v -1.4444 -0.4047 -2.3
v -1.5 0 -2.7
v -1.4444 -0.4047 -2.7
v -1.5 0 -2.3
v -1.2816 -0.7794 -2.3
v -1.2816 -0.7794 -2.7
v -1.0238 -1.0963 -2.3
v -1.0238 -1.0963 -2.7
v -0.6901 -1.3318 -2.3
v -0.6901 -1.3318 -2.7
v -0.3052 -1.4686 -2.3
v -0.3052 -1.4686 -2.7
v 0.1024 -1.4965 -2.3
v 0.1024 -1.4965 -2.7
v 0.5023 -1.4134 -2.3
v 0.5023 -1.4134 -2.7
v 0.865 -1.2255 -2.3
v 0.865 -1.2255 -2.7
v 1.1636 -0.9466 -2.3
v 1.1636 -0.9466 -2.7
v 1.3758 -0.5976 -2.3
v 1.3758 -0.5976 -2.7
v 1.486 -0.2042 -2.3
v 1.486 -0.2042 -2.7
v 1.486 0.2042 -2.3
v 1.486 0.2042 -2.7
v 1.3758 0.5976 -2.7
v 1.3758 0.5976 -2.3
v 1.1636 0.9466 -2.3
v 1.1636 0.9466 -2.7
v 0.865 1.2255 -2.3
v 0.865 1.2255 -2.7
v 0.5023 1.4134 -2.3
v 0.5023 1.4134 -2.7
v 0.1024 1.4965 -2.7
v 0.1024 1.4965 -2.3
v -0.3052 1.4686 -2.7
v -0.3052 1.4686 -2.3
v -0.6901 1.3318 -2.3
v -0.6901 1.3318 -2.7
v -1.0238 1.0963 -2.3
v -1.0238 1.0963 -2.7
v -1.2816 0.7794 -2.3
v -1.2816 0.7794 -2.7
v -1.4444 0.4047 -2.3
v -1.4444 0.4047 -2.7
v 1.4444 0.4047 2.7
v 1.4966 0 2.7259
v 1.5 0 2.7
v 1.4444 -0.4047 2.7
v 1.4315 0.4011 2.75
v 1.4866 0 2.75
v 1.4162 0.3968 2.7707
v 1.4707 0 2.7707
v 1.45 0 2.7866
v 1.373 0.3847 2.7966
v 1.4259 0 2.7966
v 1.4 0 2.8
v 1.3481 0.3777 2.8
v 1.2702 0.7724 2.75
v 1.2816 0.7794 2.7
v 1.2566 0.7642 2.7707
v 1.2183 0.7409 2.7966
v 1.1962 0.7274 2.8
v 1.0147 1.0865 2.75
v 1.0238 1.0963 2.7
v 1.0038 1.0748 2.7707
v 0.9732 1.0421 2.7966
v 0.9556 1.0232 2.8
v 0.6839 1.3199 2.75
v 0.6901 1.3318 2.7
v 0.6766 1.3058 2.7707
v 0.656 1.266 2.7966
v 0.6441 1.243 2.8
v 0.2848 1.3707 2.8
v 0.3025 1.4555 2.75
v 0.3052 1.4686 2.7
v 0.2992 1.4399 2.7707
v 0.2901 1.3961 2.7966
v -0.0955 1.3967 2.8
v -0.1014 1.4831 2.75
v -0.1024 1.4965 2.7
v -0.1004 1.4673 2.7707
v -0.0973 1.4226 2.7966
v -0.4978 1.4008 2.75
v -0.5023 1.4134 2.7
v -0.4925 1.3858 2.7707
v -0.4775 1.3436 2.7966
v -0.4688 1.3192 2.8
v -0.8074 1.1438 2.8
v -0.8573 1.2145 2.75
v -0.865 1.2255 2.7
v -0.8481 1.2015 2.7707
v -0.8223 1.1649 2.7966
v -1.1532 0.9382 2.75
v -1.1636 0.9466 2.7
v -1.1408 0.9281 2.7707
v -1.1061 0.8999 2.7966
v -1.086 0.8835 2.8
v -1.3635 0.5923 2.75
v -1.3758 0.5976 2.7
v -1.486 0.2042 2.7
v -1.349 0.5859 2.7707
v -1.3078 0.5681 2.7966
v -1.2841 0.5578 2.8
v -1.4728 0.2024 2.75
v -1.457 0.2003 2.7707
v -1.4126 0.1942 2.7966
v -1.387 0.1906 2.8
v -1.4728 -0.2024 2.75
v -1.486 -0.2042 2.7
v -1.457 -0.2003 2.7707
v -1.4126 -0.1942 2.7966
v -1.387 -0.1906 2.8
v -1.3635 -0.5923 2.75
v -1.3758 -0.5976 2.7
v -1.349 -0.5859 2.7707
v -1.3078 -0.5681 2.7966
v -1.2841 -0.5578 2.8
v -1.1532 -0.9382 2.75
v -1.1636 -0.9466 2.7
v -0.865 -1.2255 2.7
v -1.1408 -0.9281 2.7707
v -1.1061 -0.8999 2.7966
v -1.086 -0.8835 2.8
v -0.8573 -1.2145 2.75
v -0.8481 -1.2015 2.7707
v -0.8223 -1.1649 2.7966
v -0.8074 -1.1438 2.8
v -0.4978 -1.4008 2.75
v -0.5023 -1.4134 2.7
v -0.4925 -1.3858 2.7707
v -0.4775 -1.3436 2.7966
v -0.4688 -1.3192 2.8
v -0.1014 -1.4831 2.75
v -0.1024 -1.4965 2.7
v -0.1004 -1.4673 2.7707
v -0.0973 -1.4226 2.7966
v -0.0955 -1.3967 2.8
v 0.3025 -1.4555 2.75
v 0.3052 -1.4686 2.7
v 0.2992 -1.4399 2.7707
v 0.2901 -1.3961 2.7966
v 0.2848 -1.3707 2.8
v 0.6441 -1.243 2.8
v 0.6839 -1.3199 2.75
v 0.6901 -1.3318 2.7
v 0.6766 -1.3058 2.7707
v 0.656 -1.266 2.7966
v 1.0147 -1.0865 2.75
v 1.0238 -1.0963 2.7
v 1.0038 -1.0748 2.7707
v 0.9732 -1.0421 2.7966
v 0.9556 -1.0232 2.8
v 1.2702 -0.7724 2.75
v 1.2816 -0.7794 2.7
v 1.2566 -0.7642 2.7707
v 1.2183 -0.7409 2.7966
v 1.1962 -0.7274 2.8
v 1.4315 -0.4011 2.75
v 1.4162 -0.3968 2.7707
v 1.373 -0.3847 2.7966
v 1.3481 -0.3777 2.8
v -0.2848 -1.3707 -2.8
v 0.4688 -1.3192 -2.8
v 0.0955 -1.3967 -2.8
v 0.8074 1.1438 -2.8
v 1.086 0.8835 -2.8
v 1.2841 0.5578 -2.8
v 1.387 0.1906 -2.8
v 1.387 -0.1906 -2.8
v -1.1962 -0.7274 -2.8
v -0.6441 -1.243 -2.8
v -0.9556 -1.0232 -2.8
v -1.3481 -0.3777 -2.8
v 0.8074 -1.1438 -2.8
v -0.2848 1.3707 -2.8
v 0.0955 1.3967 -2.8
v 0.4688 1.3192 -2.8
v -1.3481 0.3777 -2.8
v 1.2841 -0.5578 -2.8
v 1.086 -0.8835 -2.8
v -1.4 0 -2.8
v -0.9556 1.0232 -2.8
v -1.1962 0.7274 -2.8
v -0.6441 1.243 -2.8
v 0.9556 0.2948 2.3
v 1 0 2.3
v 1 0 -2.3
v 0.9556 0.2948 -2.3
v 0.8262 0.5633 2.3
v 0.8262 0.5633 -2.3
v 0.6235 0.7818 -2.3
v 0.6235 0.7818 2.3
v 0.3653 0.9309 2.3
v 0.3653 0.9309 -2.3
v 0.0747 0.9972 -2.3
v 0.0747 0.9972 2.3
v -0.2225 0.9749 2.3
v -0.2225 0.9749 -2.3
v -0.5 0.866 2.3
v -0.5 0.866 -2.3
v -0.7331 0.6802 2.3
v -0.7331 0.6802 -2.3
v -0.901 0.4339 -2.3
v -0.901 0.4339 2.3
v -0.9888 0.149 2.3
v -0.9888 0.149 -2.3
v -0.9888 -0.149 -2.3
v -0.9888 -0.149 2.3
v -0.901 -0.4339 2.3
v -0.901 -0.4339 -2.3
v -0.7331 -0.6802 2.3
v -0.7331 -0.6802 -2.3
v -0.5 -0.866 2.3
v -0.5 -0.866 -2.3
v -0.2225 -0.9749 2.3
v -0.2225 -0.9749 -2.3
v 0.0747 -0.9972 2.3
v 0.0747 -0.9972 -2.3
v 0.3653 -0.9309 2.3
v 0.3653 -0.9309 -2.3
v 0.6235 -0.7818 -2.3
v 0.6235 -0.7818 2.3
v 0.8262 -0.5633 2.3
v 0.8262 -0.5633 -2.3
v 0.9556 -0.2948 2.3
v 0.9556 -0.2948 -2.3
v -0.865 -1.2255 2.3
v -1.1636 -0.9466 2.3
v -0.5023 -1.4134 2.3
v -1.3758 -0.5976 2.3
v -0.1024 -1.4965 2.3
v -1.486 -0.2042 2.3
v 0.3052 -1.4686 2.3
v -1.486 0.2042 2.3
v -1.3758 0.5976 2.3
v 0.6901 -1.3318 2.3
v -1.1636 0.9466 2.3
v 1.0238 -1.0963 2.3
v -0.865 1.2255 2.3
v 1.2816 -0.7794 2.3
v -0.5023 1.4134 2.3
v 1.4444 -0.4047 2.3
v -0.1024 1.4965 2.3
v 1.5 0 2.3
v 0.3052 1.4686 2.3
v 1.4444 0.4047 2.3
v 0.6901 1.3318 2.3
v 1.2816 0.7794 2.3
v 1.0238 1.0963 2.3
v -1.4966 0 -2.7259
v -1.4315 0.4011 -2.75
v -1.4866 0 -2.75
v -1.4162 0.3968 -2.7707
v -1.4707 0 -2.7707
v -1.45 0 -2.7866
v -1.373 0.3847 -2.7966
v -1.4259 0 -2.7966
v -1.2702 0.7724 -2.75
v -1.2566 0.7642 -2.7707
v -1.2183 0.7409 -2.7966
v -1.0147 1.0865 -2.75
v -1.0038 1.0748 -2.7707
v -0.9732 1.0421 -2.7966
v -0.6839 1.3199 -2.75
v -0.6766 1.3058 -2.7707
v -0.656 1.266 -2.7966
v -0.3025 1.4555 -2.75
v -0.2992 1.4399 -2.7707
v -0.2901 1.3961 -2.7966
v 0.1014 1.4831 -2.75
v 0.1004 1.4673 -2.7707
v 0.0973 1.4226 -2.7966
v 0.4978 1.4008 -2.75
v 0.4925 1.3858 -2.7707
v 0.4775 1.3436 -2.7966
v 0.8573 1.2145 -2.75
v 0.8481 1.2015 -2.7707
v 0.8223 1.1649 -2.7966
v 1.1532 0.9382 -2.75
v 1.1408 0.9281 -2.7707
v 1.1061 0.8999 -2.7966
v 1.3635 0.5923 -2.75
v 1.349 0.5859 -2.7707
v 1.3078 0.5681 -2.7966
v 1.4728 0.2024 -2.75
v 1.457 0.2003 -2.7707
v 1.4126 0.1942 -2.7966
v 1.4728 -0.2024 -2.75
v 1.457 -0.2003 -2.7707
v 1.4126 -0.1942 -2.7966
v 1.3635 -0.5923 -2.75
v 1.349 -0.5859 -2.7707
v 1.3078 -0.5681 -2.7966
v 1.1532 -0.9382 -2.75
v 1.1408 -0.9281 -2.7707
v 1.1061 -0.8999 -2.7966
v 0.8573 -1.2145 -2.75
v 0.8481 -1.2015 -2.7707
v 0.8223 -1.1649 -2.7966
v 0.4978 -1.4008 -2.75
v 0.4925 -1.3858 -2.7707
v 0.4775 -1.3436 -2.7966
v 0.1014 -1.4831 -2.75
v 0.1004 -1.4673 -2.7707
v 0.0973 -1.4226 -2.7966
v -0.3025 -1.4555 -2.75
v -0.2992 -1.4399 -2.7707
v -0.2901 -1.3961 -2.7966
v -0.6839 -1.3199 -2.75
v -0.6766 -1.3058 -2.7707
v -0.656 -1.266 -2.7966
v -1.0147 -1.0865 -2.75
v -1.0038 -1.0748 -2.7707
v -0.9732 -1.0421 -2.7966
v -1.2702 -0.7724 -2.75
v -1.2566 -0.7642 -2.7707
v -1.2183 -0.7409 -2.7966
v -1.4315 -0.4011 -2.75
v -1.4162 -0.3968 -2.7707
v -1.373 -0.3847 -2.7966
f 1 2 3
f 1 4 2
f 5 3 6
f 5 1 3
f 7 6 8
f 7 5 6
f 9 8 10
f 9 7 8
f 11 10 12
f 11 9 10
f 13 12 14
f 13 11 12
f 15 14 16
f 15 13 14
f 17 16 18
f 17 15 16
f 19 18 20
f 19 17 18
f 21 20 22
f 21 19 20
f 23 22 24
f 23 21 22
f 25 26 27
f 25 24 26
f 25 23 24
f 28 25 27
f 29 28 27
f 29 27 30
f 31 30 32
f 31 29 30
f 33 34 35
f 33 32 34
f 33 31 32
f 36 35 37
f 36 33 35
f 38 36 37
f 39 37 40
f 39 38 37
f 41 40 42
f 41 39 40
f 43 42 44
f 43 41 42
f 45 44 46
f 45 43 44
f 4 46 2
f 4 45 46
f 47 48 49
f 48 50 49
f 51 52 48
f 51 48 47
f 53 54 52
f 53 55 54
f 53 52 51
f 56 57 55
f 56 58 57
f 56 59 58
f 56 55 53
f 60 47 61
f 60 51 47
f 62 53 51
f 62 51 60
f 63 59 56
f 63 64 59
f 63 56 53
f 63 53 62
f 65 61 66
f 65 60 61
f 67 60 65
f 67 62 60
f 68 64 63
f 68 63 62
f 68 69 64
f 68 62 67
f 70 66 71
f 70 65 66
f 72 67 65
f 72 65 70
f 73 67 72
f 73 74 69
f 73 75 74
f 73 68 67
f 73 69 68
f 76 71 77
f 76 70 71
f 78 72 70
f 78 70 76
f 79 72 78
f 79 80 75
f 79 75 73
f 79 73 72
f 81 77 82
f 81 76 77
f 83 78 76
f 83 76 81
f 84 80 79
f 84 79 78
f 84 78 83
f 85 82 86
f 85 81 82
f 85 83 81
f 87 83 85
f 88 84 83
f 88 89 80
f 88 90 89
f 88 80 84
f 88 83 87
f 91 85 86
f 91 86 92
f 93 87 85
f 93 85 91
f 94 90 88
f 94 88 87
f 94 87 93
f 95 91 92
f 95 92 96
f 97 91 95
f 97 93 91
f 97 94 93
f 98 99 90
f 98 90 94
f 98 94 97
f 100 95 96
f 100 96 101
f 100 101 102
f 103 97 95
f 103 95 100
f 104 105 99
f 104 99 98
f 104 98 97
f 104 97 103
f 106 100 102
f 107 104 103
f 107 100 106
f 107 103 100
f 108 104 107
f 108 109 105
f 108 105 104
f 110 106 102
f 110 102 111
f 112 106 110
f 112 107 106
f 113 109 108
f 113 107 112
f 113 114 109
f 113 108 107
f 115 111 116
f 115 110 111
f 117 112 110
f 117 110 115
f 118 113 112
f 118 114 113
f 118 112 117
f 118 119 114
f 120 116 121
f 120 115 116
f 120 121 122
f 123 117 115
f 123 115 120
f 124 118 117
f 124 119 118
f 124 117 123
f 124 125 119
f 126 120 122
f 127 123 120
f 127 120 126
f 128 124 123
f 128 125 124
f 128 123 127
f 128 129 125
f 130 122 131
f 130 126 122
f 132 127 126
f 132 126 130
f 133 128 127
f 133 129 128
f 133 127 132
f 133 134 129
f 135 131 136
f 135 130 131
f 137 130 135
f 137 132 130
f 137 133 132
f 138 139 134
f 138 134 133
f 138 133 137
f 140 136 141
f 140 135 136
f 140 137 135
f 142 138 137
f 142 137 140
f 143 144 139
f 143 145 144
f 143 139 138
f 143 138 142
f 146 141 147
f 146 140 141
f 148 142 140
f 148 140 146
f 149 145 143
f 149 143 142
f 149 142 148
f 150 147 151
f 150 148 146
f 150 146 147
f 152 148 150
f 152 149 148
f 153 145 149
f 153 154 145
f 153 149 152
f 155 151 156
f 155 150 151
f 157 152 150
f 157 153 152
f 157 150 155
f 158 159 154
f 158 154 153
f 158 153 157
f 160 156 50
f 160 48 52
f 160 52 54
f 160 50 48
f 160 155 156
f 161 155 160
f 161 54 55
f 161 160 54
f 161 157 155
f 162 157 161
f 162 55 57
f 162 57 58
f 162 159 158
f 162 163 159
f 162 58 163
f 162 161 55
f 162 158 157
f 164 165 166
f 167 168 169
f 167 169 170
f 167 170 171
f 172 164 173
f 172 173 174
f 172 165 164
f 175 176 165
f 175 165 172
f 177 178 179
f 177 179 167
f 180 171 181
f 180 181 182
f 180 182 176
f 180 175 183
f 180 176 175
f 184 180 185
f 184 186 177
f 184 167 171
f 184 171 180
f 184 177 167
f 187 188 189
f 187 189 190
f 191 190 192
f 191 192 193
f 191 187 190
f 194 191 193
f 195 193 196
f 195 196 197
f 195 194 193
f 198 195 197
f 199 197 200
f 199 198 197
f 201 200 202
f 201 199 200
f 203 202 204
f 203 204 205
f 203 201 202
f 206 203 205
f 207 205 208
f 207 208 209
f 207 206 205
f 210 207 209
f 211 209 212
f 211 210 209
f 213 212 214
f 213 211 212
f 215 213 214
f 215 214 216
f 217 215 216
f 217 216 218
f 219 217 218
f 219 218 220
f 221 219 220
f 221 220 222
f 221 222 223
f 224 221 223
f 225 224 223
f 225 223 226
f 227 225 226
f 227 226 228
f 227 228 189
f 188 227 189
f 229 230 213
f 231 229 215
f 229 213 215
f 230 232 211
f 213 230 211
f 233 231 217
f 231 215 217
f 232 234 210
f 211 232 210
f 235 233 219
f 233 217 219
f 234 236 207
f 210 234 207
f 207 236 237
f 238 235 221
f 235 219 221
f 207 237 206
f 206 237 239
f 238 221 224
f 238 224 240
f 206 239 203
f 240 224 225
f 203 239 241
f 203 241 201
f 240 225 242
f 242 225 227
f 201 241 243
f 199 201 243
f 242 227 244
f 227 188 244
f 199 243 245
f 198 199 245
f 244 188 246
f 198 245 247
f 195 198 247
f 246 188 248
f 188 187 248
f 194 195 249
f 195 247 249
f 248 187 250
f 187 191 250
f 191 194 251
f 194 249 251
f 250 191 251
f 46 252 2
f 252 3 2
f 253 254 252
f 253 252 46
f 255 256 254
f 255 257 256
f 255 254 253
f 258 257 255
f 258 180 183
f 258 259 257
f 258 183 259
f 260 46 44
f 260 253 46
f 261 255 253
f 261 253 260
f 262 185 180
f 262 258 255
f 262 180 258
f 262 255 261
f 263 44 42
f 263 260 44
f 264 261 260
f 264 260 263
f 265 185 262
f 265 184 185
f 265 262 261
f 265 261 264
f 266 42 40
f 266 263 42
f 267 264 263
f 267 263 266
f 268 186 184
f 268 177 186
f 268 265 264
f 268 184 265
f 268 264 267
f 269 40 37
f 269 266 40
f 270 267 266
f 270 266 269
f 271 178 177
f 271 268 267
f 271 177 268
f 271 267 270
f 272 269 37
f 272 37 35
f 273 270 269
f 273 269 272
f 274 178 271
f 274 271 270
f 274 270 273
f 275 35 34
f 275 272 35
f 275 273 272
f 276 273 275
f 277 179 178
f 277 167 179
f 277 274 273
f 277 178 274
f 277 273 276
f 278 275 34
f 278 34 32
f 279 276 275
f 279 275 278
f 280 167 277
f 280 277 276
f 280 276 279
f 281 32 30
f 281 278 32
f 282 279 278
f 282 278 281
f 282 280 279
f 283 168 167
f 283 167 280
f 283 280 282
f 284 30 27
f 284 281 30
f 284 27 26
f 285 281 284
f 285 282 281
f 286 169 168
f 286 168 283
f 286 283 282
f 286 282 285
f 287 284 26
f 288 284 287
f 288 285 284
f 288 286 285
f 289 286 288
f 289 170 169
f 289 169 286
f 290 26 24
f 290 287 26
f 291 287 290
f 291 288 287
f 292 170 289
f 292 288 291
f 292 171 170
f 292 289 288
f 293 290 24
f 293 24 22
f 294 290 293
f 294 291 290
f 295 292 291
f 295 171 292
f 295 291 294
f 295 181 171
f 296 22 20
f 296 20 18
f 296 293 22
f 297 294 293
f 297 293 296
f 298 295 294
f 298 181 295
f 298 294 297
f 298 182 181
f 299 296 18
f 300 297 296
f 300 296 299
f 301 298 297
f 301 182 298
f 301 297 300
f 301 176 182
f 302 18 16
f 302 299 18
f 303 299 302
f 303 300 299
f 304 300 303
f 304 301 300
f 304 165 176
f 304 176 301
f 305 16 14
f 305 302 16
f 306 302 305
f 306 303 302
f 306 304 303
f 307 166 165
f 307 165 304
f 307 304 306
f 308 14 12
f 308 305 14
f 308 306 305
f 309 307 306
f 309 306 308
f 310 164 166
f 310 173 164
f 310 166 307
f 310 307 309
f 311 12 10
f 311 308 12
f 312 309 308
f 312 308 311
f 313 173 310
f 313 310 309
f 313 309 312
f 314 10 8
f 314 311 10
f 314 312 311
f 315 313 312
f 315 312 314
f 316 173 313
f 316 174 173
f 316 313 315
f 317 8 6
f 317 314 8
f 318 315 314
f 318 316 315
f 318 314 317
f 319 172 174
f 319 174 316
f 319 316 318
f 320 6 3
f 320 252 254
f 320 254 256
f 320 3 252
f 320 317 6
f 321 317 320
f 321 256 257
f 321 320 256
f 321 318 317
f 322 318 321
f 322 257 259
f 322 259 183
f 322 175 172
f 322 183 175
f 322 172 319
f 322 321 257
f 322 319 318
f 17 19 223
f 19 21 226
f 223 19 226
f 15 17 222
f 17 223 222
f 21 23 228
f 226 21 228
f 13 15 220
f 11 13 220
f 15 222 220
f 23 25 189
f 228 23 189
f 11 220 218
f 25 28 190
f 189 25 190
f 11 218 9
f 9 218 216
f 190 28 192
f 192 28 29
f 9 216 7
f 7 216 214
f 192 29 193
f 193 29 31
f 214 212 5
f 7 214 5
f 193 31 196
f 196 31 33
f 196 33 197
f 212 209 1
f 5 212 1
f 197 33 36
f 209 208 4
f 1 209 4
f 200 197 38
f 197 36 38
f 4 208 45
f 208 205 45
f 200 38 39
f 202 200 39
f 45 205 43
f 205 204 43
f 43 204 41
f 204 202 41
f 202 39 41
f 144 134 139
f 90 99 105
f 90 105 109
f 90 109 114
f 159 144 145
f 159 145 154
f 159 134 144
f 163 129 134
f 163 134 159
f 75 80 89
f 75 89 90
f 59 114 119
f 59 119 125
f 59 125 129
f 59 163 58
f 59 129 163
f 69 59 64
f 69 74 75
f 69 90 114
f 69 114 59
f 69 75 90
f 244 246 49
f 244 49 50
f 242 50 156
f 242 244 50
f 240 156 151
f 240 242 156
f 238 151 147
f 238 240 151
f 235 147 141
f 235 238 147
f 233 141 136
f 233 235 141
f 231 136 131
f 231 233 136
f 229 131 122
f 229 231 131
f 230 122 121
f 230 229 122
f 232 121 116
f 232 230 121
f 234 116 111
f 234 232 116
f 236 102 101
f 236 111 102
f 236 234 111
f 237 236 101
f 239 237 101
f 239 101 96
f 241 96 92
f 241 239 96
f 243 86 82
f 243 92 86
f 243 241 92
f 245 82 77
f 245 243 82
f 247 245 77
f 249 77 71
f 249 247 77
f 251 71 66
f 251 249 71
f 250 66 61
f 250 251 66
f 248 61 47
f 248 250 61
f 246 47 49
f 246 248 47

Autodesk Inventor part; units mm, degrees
ref_plane "YZ Plane" through (0, 0, 0) normal (1, 0, 0) x (0, 1, 0)
sketch "Sketch1" plane through (0, 0, 0) normal (0, 0, 1) x (1, 0, 0)
  circle A0 centre (0, 0) radius 1
  dimension "d0" = 2
extrude "Extrusion1" add sketch "Sketch1" along normal mid plane 4.6
ref_plane "Work Plane1" through (0, 0, 2.3) normal (0, 0, 1) x (1, 0, 0)
ref_plane "Work Plane2" through (0, 0, -2.3) normal (0, 0, -1) x (-1, 0, 0)
sketch "Sketch2" plane through (0, 0, 2.3) normal (0, 0, 1) x (1, 0, 0)
  circle A0 centre (0, 0) radius 1.5
  dimension "d5" = 3
extrude "Extrusion2" add sketch "Sketch2" along normal blind 0.5
sketch "Sketch3" plane through (0, 0, -2.3) normal (0, 0, -1) x (-1, 0, 0)
  circle A0 centre (0, 0) radius 1 projected
  circle A1 centre (0, 0) radius 1.5
  dimension "d8" = 3
extrude "Extrusion3" add sketch "Sketch3" along normal blind 0.5 contours A0 | A1
fillet "Fillet1" radius 0.1 2 edges at (-1.5, 0, 2.8) (1.5, 0, -2.8)
properties part number "New_ThinAxle1"
